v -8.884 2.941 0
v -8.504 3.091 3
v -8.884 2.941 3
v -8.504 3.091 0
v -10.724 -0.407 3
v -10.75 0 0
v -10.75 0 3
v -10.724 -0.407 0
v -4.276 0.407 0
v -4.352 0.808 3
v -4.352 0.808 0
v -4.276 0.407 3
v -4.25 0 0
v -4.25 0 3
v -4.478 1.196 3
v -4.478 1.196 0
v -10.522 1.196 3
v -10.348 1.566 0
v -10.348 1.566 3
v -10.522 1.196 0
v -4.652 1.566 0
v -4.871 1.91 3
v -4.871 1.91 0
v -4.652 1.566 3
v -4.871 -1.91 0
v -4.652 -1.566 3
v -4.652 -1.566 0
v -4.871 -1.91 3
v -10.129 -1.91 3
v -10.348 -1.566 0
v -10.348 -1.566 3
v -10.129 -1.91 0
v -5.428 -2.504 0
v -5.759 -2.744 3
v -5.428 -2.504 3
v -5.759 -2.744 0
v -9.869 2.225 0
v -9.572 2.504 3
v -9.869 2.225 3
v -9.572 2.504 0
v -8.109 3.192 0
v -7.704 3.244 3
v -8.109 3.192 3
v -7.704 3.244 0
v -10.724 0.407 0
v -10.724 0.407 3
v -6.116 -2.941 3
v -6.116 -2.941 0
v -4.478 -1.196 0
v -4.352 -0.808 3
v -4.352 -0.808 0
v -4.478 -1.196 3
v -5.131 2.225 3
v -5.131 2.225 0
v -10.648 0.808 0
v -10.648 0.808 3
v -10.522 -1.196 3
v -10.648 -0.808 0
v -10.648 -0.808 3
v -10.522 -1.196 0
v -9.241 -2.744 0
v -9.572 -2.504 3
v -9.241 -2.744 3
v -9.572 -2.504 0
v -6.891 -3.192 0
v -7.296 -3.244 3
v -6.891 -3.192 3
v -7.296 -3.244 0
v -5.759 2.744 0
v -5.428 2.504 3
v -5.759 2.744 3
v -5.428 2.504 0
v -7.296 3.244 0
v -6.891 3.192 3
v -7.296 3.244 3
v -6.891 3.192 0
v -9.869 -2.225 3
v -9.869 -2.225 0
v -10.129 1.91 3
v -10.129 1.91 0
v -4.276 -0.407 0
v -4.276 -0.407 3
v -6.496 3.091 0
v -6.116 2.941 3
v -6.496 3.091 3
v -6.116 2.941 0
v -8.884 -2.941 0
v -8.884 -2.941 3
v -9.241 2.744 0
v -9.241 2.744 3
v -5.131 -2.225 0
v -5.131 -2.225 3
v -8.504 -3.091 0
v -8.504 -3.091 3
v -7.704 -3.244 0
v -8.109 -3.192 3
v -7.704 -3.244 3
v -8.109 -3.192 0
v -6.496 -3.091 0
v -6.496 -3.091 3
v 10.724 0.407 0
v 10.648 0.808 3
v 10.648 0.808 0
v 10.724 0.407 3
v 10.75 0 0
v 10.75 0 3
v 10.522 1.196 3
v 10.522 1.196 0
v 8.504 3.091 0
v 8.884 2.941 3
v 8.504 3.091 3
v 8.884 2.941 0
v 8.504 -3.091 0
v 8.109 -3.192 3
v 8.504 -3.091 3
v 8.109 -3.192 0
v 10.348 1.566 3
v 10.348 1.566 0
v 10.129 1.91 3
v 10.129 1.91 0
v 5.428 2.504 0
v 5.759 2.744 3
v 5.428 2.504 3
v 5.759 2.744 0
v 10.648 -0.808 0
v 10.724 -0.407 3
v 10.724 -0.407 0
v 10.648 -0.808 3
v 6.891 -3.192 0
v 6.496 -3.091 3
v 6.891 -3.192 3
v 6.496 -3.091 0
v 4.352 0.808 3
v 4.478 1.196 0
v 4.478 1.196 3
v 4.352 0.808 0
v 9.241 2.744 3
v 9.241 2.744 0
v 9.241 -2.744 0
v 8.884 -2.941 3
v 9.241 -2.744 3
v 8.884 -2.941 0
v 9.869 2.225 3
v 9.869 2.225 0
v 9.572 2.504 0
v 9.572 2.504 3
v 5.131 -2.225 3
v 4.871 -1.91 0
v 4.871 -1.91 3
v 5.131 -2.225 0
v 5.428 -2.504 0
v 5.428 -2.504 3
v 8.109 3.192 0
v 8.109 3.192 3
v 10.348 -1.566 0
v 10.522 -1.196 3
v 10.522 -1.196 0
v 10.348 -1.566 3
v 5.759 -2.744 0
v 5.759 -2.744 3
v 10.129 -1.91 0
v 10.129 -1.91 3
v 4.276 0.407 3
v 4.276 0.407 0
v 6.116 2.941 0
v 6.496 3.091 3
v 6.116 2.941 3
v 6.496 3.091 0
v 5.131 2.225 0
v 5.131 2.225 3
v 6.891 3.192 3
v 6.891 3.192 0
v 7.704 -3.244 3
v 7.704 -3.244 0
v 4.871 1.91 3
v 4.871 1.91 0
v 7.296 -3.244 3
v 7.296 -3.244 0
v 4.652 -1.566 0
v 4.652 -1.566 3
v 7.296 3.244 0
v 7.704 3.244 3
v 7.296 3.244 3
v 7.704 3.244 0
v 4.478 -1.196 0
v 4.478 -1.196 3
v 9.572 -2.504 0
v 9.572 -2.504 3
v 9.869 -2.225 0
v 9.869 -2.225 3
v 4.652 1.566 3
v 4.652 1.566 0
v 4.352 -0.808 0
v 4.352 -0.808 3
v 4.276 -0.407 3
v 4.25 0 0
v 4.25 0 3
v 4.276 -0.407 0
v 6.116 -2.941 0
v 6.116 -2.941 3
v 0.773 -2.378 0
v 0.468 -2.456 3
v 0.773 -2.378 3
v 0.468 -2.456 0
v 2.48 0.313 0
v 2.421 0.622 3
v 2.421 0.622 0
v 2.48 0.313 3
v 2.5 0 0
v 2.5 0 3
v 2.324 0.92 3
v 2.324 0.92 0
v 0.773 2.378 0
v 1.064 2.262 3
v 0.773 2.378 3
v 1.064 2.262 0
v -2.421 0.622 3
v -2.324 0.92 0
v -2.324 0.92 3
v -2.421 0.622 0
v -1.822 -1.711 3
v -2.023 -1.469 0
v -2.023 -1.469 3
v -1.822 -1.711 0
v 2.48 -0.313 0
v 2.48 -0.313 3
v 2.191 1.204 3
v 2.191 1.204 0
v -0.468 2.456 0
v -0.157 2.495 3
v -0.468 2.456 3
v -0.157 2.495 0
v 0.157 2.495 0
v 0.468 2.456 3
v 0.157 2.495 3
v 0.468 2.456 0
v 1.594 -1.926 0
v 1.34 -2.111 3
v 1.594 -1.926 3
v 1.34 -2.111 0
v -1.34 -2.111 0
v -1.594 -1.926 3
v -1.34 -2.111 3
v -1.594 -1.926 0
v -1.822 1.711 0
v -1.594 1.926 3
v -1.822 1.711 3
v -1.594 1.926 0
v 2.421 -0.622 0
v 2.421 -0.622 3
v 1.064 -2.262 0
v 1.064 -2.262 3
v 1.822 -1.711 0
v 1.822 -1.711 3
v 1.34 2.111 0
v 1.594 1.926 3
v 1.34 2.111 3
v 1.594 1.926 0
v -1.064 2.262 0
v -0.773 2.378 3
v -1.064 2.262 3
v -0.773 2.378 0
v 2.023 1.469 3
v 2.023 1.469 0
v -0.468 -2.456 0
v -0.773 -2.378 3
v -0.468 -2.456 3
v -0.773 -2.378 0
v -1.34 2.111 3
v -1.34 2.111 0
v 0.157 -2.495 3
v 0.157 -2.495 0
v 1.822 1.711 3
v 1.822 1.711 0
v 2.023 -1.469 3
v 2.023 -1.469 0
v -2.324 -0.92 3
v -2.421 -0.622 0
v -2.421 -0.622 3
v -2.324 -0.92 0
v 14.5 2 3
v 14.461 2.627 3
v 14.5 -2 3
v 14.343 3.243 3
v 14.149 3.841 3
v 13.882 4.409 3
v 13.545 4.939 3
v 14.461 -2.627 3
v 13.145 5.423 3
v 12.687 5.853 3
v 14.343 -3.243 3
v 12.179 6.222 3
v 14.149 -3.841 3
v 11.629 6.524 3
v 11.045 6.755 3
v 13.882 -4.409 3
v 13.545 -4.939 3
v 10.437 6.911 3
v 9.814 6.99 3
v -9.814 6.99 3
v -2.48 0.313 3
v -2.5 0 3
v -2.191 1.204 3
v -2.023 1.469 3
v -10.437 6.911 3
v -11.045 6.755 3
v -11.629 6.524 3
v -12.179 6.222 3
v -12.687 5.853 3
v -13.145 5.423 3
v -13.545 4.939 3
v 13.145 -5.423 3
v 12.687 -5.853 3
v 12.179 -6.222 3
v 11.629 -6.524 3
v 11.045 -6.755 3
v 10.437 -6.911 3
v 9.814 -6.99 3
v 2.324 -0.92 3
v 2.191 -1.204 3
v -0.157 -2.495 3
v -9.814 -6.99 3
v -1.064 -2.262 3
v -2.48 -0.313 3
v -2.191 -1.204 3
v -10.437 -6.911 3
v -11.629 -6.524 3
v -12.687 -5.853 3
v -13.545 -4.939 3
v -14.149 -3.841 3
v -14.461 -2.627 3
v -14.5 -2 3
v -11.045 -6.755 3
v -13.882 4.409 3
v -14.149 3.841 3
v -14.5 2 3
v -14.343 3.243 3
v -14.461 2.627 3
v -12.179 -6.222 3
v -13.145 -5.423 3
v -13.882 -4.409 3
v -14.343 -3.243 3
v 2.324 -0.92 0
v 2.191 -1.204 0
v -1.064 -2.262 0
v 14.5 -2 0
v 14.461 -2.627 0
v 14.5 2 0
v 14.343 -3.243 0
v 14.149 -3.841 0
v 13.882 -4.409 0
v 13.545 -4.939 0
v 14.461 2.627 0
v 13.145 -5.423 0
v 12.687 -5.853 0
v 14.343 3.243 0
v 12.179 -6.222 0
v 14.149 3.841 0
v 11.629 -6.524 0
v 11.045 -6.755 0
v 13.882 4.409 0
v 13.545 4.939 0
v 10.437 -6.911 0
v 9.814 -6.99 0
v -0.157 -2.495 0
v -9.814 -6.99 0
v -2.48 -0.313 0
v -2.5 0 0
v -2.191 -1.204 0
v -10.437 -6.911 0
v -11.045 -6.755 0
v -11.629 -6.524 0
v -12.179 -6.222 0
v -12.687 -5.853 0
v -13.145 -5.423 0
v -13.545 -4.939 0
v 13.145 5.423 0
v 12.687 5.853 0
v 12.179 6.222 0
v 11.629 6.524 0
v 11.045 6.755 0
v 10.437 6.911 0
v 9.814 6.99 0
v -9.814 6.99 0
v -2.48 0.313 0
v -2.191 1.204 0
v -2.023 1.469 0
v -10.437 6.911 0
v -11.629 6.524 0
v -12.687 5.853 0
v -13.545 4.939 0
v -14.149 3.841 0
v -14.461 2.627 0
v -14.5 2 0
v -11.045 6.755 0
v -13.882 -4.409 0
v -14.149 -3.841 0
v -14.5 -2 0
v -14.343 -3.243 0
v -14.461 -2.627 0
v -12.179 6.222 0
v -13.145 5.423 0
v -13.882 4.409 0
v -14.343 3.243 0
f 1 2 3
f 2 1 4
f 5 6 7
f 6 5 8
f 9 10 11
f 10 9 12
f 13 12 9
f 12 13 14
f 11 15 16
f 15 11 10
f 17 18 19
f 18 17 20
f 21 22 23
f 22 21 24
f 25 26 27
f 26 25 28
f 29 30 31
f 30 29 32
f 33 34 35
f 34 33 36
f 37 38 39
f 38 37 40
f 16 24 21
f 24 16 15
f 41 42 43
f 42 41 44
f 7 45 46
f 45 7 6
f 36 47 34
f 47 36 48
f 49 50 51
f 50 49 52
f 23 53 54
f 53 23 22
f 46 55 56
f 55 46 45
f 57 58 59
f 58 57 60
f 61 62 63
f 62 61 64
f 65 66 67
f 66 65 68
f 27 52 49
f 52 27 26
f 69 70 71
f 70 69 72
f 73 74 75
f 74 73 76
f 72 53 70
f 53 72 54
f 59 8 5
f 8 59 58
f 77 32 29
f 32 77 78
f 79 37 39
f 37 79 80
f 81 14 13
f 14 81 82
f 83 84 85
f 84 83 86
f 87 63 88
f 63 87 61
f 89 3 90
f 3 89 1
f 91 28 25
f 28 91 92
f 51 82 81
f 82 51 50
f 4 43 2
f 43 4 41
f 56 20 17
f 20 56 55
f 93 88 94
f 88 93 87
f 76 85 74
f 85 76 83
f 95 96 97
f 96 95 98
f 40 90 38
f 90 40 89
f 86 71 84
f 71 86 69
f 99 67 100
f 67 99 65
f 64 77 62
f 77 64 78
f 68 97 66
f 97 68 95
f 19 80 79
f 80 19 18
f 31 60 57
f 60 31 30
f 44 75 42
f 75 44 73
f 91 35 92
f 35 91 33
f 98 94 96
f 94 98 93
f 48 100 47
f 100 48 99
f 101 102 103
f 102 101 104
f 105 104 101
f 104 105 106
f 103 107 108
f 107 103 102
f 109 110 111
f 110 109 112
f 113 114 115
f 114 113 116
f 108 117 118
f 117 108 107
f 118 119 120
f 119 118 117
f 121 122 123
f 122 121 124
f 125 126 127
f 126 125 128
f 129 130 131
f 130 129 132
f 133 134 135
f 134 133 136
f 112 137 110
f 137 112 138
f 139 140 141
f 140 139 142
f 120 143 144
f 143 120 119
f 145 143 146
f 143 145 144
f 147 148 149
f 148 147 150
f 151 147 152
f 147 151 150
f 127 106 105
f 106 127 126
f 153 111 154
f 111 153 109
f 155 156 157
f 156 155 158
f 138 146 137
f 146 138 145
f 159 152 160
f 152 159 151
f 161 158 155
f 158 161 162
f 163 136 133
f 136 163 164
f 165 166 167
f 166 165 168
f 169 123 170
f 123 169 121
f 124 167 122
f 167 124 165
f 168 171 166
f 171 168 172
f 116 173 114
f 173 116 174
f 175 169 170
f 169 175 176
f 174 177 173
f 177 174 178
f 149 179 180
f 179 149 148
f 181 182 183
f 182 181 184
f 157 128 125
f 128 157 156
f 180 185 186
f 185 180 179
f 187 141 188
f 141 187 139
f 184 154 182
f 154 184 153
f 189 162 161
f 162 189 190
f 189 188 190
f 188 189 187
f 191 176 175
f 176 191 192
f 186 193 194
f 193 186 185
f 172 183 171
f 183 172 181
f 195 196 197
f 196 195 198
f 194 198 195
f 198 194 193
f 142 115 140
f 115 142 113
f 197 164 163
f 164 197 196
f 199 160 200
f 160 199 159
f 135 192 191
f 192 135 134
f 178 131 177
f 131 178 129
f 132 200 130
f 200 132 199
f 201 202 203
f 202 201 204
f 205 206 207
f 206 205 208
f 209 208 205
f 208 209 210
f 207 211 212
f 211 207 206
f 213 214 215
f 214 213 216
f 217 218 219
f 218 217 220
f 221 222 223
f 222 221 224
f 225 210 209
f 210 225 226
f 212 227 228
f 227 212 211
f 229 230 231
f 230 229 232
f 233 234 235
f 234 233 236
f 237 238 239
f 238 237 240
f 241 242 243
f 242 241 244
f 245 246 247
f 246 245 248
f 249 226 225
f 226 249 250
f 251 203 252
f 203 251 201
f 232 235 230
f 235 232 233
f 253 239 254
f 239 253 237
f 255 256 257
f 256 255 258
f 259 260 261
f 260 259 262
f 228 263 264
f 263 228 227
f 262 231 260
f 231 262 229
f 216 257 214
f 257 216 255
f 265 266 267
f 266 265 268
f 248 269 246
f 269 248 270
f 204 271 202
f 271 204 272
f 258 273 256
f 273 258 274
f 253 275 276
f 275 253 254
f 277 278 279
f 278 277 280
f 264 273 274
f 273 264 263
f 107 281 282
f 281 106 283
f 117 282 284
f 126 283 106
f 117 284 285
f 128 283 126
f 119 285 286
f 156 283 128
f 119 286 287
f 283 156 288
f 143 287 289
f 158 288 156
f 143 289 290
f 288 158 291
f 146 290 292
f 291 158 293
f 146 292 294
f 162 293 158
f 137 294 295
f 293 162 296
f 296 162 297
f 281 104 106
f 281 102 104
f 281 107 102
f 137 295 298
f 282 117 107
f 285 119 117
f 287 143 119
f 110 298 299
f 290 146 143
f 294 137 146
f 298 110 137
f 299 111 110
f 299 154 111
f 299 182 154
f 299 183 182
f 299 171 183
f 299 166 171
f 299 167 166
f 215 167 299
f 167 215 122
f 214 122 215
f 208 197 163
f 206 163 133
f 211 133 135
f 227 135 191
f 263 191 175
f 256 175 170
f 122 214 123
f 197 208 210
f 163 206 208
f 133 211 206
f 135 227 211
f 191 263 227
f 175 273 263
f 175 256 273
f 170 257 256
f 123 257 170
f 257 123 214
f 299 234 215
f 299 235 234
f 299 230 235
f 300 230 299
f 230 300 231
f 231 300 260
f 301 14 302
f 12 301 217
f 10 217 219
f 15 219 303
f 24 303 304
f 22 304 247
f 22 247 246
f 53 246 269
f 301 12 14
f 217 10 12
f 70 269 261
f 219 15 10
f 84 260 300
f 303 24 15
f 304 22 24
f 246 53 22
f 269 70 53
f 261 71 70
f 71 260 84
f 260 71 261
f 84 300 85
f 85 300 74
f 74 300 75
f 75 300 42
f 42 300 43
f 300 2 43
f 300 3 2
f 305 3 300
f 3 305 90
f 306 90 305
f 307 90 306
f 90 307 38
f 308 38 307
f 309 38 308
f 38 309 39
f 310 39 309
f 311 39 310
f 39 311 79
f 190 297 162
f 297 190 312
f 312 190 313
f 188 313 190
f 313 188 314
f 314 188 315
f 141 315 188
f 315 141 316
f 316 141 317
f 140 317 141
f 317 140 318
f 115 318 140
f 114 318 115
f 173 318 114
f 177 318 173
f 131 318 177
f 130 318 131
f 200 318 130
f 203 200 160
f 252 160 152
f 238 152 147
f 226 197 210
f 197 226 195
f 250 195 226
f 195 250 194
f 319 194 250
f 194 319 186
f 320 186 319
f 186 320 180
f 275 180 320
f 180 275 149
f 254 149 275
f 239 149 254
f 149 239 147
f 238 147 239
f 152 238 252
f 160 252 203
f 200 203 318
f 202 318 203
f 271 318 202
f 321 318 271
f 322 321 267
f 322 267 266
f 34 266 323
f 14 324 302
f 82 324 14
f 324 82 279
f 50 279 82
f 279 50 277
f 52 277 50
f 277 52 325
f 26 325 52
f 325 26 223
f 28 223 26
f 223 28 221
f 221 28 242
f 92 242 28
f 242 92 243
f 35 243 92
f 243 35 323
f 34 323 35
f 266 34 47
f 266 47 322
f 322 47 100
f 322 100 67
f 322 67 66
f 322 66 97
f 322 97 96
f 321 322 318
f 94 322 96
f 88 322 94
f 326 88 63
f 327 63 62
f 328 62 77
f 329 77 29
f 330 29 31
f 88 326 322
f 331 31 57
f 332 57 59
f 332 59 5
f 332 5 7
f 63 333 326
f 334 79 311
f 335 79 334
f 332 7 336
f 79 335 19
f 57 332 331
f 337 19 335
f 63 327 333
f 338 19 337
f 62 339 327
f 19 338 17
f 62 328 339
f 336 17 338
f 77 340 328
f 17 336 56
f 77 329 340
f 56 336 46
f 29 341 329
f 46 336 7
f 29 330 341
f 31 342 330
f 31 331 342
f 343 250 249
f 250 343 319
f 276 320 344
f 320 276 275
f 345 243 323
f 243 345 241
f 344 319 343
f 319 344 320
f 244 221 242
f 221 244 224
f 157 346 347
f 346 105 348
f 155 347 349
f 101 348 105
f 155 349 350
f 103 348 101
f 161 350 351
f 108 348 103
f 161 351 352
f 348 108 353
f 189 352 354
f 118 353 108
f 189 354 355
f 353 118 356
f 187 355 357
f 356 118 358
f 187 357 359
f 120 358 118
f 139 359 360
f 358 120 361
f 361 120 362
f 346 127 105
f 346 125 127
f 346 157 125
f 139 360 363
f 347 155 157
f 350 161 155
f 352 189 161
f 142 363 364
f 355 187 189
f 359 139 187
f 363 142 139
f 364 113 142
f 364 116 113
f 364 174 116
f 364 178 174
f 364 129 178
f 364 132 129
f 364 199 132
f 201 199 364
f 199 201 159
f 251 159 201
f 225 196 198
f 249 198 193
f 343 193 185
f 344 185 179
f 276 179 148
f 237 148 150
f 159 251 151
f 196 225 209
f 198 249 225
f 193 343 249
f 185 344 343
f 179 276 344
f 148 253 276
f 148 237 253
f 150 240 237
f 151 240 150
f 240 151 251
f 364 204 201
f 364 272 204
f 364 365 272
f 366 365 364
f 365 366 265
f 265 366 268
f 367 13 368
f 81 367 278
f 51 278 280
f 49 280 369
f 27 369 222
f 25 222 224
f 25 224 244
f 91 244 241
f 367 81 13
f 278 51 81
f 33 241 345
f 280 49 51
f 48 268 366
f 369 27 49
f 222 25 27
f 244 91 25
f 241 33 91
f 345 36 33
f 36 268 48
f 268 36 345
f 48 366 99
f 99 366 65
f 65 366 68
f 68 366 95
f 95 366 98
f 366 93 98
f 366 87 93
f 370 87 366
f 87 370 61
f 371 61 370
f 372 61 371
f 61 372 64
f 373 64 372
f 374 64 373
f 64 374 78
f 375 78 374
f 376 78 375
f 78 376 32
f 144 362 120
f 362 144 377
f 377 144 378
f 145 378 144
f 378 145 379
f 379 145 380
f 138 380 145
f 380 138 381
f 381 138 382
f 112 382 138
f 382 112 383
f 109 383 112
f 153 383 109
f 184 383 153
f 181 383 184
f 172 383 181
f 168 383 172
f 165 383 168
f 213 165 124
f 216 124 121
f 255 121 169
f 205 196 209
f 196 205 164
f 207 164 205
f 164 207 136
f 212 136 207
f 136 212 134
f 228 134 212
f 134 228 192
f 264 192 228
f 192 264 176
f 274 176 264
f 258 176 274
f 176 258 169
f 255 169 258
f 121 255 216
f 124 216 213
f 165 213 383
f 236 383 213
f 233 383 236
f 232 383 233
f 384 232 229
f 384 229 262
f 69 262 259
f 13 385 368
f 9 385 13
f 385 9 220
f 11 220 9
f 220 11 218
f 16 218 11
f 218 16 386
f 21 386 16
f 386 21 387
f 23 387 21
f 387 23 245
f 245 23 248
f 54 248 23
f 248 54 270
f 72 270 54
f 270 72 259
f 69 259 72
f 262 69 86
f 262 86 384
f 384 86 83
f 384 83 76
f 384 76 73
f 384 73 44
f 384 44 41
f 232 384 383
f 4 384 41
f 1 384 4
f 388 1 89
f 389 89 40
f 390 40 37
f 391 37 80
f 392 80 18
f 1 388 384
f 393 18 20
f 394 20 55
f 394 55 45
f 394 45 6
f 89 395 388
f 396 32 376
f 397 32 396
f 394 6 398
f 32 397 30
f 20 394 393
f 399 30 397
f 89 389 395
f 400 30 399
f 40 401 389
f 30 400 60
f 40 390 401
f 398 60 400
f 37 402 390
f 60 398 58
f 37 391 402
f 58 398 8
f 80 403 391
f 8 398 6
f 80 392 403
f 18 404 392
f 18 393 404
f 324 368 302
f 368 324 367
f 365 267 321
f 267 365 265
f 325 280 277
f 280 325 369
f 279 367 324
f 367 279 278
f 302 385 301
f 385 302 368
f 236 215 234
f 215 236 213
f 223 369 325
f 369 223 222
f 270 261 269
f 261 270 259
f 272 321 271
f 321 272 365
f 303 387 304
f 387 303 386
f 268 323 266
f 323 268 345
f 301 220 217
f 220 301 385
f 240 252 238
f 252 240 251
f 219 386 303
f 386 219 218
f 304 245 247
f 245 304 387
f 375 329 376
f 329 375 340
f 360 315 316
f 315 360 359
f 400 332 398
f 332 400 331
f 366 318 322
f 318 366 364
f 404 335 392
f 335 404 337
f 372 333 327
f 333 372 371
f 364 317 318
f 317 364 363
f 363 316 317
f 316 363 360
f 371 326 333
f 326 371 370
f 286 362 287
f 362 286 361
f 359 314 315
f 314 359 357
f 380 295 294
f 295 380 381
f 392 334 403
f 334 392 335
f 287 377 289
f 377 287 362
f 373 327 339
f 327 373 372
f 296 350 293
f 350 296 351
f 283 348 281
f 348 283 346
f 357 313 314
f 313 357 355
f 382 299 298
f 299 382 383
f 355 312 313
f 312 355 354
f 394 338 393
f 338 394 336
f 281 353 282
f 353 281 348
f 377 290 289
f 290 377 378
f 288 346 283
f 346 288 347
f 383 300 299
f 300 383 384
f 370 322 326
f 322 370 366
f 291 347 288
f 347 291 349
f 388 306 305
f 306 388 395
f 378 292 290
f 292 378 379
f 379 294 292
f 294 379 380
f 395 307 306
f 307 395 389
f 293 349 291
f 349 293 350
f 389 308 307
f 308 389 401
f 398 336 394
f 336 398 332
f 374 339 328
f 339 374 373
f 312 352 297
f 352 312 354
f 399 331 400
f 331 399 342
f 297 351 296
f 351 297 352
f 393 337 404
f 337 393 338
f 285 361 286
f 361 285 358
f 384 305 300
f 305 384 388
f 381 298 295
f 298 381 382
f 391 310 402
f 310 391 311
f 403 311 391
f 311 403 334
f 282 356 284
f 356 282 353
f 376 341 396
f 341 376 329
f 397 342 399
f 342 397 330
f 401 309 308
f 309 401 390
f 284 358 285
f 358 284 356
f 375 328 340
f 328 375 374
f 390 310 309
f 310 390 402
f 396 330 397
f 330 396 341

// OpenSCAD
$fn = 50;


difference() {
	union() {
		hull() {
			translate(v = [-9.5000000000, 2.0000000000, 0]) {
				cylinder(h = 3, r = 5);
			}
			translate(v = [9.5000000000, 2.0000000000, 0]) {
				cylinder(h = 3, r = 5);
			}
			translate(v = [-9.5000000000, -2.0000000000, 0]) {
				cylinder(h = 3, r = 5);
			}
			translate(v = [9.5000000000, -2.0000000000, 0]) {
				cylinder(h = 3, r = 5);
			}
		}
	}
	union() {
		#translate(v = [-7.5000000000, 0.0000000000, 0]) {
			cylinder(h = 3, r = 3.2500000000);
		}
		#translate(v = [7.5000000000, 0.0000000000, 0]) {
			cylinder(h = 3, r = 3.2500000000);
		}
		#translate(v = [-7.5000000000, 0.0000000000, -100.0000000000]) {
			cylinder(h = 200, r = 3.2500000000);
		}
		#translate(v = [-7.5000000000, 0.0000000000, -100.0000000000]) {
			cylinder(h = 200, r = 3.2500000000);
		}
		#translate(v = [7.5000000000, 0.0000000000, -100.0000000000]) {
			cylinder(h = 200, r = 3.2500000000);
		}
		#translate(v = [7.5000000000, 0.0000000000, -100.0000000000]) {
			cylinder(h = 200, r = 3.2500000000);
		}
		#translate(v = [-7.5000000000, 0.0000000000, 0]) {
			cylinder(h = 3, r = 1.8000000000);
		}
		#translate(v = [7.5000000000, 0.0000000000, 0]) {
			cylinder(h = 3, r = 1.8000000000);
		}
		#translate(v = [-7.5000000000, 0.0000000000, 0]) {
			cylinder(h = 3, r = 1.8000000000);
		}
		#translate(v = [7.5000000000, 0.0000000000, 0]) {
			cylinder(h = 3, r = 1.8000000000);
		}
		#translate(v = [-7.5000000000, 0.0000000000, 0]) {
			cylinder(h = 3, r = 1.8000000000);
		}
		#translate(v = [7.5000000000, 0.0000000000, 0]) {
			cylinder(h = 3, r = 1.8000000000);
		}
		#cylinder(h = 3, r = 2.5000000000);
	}
}
